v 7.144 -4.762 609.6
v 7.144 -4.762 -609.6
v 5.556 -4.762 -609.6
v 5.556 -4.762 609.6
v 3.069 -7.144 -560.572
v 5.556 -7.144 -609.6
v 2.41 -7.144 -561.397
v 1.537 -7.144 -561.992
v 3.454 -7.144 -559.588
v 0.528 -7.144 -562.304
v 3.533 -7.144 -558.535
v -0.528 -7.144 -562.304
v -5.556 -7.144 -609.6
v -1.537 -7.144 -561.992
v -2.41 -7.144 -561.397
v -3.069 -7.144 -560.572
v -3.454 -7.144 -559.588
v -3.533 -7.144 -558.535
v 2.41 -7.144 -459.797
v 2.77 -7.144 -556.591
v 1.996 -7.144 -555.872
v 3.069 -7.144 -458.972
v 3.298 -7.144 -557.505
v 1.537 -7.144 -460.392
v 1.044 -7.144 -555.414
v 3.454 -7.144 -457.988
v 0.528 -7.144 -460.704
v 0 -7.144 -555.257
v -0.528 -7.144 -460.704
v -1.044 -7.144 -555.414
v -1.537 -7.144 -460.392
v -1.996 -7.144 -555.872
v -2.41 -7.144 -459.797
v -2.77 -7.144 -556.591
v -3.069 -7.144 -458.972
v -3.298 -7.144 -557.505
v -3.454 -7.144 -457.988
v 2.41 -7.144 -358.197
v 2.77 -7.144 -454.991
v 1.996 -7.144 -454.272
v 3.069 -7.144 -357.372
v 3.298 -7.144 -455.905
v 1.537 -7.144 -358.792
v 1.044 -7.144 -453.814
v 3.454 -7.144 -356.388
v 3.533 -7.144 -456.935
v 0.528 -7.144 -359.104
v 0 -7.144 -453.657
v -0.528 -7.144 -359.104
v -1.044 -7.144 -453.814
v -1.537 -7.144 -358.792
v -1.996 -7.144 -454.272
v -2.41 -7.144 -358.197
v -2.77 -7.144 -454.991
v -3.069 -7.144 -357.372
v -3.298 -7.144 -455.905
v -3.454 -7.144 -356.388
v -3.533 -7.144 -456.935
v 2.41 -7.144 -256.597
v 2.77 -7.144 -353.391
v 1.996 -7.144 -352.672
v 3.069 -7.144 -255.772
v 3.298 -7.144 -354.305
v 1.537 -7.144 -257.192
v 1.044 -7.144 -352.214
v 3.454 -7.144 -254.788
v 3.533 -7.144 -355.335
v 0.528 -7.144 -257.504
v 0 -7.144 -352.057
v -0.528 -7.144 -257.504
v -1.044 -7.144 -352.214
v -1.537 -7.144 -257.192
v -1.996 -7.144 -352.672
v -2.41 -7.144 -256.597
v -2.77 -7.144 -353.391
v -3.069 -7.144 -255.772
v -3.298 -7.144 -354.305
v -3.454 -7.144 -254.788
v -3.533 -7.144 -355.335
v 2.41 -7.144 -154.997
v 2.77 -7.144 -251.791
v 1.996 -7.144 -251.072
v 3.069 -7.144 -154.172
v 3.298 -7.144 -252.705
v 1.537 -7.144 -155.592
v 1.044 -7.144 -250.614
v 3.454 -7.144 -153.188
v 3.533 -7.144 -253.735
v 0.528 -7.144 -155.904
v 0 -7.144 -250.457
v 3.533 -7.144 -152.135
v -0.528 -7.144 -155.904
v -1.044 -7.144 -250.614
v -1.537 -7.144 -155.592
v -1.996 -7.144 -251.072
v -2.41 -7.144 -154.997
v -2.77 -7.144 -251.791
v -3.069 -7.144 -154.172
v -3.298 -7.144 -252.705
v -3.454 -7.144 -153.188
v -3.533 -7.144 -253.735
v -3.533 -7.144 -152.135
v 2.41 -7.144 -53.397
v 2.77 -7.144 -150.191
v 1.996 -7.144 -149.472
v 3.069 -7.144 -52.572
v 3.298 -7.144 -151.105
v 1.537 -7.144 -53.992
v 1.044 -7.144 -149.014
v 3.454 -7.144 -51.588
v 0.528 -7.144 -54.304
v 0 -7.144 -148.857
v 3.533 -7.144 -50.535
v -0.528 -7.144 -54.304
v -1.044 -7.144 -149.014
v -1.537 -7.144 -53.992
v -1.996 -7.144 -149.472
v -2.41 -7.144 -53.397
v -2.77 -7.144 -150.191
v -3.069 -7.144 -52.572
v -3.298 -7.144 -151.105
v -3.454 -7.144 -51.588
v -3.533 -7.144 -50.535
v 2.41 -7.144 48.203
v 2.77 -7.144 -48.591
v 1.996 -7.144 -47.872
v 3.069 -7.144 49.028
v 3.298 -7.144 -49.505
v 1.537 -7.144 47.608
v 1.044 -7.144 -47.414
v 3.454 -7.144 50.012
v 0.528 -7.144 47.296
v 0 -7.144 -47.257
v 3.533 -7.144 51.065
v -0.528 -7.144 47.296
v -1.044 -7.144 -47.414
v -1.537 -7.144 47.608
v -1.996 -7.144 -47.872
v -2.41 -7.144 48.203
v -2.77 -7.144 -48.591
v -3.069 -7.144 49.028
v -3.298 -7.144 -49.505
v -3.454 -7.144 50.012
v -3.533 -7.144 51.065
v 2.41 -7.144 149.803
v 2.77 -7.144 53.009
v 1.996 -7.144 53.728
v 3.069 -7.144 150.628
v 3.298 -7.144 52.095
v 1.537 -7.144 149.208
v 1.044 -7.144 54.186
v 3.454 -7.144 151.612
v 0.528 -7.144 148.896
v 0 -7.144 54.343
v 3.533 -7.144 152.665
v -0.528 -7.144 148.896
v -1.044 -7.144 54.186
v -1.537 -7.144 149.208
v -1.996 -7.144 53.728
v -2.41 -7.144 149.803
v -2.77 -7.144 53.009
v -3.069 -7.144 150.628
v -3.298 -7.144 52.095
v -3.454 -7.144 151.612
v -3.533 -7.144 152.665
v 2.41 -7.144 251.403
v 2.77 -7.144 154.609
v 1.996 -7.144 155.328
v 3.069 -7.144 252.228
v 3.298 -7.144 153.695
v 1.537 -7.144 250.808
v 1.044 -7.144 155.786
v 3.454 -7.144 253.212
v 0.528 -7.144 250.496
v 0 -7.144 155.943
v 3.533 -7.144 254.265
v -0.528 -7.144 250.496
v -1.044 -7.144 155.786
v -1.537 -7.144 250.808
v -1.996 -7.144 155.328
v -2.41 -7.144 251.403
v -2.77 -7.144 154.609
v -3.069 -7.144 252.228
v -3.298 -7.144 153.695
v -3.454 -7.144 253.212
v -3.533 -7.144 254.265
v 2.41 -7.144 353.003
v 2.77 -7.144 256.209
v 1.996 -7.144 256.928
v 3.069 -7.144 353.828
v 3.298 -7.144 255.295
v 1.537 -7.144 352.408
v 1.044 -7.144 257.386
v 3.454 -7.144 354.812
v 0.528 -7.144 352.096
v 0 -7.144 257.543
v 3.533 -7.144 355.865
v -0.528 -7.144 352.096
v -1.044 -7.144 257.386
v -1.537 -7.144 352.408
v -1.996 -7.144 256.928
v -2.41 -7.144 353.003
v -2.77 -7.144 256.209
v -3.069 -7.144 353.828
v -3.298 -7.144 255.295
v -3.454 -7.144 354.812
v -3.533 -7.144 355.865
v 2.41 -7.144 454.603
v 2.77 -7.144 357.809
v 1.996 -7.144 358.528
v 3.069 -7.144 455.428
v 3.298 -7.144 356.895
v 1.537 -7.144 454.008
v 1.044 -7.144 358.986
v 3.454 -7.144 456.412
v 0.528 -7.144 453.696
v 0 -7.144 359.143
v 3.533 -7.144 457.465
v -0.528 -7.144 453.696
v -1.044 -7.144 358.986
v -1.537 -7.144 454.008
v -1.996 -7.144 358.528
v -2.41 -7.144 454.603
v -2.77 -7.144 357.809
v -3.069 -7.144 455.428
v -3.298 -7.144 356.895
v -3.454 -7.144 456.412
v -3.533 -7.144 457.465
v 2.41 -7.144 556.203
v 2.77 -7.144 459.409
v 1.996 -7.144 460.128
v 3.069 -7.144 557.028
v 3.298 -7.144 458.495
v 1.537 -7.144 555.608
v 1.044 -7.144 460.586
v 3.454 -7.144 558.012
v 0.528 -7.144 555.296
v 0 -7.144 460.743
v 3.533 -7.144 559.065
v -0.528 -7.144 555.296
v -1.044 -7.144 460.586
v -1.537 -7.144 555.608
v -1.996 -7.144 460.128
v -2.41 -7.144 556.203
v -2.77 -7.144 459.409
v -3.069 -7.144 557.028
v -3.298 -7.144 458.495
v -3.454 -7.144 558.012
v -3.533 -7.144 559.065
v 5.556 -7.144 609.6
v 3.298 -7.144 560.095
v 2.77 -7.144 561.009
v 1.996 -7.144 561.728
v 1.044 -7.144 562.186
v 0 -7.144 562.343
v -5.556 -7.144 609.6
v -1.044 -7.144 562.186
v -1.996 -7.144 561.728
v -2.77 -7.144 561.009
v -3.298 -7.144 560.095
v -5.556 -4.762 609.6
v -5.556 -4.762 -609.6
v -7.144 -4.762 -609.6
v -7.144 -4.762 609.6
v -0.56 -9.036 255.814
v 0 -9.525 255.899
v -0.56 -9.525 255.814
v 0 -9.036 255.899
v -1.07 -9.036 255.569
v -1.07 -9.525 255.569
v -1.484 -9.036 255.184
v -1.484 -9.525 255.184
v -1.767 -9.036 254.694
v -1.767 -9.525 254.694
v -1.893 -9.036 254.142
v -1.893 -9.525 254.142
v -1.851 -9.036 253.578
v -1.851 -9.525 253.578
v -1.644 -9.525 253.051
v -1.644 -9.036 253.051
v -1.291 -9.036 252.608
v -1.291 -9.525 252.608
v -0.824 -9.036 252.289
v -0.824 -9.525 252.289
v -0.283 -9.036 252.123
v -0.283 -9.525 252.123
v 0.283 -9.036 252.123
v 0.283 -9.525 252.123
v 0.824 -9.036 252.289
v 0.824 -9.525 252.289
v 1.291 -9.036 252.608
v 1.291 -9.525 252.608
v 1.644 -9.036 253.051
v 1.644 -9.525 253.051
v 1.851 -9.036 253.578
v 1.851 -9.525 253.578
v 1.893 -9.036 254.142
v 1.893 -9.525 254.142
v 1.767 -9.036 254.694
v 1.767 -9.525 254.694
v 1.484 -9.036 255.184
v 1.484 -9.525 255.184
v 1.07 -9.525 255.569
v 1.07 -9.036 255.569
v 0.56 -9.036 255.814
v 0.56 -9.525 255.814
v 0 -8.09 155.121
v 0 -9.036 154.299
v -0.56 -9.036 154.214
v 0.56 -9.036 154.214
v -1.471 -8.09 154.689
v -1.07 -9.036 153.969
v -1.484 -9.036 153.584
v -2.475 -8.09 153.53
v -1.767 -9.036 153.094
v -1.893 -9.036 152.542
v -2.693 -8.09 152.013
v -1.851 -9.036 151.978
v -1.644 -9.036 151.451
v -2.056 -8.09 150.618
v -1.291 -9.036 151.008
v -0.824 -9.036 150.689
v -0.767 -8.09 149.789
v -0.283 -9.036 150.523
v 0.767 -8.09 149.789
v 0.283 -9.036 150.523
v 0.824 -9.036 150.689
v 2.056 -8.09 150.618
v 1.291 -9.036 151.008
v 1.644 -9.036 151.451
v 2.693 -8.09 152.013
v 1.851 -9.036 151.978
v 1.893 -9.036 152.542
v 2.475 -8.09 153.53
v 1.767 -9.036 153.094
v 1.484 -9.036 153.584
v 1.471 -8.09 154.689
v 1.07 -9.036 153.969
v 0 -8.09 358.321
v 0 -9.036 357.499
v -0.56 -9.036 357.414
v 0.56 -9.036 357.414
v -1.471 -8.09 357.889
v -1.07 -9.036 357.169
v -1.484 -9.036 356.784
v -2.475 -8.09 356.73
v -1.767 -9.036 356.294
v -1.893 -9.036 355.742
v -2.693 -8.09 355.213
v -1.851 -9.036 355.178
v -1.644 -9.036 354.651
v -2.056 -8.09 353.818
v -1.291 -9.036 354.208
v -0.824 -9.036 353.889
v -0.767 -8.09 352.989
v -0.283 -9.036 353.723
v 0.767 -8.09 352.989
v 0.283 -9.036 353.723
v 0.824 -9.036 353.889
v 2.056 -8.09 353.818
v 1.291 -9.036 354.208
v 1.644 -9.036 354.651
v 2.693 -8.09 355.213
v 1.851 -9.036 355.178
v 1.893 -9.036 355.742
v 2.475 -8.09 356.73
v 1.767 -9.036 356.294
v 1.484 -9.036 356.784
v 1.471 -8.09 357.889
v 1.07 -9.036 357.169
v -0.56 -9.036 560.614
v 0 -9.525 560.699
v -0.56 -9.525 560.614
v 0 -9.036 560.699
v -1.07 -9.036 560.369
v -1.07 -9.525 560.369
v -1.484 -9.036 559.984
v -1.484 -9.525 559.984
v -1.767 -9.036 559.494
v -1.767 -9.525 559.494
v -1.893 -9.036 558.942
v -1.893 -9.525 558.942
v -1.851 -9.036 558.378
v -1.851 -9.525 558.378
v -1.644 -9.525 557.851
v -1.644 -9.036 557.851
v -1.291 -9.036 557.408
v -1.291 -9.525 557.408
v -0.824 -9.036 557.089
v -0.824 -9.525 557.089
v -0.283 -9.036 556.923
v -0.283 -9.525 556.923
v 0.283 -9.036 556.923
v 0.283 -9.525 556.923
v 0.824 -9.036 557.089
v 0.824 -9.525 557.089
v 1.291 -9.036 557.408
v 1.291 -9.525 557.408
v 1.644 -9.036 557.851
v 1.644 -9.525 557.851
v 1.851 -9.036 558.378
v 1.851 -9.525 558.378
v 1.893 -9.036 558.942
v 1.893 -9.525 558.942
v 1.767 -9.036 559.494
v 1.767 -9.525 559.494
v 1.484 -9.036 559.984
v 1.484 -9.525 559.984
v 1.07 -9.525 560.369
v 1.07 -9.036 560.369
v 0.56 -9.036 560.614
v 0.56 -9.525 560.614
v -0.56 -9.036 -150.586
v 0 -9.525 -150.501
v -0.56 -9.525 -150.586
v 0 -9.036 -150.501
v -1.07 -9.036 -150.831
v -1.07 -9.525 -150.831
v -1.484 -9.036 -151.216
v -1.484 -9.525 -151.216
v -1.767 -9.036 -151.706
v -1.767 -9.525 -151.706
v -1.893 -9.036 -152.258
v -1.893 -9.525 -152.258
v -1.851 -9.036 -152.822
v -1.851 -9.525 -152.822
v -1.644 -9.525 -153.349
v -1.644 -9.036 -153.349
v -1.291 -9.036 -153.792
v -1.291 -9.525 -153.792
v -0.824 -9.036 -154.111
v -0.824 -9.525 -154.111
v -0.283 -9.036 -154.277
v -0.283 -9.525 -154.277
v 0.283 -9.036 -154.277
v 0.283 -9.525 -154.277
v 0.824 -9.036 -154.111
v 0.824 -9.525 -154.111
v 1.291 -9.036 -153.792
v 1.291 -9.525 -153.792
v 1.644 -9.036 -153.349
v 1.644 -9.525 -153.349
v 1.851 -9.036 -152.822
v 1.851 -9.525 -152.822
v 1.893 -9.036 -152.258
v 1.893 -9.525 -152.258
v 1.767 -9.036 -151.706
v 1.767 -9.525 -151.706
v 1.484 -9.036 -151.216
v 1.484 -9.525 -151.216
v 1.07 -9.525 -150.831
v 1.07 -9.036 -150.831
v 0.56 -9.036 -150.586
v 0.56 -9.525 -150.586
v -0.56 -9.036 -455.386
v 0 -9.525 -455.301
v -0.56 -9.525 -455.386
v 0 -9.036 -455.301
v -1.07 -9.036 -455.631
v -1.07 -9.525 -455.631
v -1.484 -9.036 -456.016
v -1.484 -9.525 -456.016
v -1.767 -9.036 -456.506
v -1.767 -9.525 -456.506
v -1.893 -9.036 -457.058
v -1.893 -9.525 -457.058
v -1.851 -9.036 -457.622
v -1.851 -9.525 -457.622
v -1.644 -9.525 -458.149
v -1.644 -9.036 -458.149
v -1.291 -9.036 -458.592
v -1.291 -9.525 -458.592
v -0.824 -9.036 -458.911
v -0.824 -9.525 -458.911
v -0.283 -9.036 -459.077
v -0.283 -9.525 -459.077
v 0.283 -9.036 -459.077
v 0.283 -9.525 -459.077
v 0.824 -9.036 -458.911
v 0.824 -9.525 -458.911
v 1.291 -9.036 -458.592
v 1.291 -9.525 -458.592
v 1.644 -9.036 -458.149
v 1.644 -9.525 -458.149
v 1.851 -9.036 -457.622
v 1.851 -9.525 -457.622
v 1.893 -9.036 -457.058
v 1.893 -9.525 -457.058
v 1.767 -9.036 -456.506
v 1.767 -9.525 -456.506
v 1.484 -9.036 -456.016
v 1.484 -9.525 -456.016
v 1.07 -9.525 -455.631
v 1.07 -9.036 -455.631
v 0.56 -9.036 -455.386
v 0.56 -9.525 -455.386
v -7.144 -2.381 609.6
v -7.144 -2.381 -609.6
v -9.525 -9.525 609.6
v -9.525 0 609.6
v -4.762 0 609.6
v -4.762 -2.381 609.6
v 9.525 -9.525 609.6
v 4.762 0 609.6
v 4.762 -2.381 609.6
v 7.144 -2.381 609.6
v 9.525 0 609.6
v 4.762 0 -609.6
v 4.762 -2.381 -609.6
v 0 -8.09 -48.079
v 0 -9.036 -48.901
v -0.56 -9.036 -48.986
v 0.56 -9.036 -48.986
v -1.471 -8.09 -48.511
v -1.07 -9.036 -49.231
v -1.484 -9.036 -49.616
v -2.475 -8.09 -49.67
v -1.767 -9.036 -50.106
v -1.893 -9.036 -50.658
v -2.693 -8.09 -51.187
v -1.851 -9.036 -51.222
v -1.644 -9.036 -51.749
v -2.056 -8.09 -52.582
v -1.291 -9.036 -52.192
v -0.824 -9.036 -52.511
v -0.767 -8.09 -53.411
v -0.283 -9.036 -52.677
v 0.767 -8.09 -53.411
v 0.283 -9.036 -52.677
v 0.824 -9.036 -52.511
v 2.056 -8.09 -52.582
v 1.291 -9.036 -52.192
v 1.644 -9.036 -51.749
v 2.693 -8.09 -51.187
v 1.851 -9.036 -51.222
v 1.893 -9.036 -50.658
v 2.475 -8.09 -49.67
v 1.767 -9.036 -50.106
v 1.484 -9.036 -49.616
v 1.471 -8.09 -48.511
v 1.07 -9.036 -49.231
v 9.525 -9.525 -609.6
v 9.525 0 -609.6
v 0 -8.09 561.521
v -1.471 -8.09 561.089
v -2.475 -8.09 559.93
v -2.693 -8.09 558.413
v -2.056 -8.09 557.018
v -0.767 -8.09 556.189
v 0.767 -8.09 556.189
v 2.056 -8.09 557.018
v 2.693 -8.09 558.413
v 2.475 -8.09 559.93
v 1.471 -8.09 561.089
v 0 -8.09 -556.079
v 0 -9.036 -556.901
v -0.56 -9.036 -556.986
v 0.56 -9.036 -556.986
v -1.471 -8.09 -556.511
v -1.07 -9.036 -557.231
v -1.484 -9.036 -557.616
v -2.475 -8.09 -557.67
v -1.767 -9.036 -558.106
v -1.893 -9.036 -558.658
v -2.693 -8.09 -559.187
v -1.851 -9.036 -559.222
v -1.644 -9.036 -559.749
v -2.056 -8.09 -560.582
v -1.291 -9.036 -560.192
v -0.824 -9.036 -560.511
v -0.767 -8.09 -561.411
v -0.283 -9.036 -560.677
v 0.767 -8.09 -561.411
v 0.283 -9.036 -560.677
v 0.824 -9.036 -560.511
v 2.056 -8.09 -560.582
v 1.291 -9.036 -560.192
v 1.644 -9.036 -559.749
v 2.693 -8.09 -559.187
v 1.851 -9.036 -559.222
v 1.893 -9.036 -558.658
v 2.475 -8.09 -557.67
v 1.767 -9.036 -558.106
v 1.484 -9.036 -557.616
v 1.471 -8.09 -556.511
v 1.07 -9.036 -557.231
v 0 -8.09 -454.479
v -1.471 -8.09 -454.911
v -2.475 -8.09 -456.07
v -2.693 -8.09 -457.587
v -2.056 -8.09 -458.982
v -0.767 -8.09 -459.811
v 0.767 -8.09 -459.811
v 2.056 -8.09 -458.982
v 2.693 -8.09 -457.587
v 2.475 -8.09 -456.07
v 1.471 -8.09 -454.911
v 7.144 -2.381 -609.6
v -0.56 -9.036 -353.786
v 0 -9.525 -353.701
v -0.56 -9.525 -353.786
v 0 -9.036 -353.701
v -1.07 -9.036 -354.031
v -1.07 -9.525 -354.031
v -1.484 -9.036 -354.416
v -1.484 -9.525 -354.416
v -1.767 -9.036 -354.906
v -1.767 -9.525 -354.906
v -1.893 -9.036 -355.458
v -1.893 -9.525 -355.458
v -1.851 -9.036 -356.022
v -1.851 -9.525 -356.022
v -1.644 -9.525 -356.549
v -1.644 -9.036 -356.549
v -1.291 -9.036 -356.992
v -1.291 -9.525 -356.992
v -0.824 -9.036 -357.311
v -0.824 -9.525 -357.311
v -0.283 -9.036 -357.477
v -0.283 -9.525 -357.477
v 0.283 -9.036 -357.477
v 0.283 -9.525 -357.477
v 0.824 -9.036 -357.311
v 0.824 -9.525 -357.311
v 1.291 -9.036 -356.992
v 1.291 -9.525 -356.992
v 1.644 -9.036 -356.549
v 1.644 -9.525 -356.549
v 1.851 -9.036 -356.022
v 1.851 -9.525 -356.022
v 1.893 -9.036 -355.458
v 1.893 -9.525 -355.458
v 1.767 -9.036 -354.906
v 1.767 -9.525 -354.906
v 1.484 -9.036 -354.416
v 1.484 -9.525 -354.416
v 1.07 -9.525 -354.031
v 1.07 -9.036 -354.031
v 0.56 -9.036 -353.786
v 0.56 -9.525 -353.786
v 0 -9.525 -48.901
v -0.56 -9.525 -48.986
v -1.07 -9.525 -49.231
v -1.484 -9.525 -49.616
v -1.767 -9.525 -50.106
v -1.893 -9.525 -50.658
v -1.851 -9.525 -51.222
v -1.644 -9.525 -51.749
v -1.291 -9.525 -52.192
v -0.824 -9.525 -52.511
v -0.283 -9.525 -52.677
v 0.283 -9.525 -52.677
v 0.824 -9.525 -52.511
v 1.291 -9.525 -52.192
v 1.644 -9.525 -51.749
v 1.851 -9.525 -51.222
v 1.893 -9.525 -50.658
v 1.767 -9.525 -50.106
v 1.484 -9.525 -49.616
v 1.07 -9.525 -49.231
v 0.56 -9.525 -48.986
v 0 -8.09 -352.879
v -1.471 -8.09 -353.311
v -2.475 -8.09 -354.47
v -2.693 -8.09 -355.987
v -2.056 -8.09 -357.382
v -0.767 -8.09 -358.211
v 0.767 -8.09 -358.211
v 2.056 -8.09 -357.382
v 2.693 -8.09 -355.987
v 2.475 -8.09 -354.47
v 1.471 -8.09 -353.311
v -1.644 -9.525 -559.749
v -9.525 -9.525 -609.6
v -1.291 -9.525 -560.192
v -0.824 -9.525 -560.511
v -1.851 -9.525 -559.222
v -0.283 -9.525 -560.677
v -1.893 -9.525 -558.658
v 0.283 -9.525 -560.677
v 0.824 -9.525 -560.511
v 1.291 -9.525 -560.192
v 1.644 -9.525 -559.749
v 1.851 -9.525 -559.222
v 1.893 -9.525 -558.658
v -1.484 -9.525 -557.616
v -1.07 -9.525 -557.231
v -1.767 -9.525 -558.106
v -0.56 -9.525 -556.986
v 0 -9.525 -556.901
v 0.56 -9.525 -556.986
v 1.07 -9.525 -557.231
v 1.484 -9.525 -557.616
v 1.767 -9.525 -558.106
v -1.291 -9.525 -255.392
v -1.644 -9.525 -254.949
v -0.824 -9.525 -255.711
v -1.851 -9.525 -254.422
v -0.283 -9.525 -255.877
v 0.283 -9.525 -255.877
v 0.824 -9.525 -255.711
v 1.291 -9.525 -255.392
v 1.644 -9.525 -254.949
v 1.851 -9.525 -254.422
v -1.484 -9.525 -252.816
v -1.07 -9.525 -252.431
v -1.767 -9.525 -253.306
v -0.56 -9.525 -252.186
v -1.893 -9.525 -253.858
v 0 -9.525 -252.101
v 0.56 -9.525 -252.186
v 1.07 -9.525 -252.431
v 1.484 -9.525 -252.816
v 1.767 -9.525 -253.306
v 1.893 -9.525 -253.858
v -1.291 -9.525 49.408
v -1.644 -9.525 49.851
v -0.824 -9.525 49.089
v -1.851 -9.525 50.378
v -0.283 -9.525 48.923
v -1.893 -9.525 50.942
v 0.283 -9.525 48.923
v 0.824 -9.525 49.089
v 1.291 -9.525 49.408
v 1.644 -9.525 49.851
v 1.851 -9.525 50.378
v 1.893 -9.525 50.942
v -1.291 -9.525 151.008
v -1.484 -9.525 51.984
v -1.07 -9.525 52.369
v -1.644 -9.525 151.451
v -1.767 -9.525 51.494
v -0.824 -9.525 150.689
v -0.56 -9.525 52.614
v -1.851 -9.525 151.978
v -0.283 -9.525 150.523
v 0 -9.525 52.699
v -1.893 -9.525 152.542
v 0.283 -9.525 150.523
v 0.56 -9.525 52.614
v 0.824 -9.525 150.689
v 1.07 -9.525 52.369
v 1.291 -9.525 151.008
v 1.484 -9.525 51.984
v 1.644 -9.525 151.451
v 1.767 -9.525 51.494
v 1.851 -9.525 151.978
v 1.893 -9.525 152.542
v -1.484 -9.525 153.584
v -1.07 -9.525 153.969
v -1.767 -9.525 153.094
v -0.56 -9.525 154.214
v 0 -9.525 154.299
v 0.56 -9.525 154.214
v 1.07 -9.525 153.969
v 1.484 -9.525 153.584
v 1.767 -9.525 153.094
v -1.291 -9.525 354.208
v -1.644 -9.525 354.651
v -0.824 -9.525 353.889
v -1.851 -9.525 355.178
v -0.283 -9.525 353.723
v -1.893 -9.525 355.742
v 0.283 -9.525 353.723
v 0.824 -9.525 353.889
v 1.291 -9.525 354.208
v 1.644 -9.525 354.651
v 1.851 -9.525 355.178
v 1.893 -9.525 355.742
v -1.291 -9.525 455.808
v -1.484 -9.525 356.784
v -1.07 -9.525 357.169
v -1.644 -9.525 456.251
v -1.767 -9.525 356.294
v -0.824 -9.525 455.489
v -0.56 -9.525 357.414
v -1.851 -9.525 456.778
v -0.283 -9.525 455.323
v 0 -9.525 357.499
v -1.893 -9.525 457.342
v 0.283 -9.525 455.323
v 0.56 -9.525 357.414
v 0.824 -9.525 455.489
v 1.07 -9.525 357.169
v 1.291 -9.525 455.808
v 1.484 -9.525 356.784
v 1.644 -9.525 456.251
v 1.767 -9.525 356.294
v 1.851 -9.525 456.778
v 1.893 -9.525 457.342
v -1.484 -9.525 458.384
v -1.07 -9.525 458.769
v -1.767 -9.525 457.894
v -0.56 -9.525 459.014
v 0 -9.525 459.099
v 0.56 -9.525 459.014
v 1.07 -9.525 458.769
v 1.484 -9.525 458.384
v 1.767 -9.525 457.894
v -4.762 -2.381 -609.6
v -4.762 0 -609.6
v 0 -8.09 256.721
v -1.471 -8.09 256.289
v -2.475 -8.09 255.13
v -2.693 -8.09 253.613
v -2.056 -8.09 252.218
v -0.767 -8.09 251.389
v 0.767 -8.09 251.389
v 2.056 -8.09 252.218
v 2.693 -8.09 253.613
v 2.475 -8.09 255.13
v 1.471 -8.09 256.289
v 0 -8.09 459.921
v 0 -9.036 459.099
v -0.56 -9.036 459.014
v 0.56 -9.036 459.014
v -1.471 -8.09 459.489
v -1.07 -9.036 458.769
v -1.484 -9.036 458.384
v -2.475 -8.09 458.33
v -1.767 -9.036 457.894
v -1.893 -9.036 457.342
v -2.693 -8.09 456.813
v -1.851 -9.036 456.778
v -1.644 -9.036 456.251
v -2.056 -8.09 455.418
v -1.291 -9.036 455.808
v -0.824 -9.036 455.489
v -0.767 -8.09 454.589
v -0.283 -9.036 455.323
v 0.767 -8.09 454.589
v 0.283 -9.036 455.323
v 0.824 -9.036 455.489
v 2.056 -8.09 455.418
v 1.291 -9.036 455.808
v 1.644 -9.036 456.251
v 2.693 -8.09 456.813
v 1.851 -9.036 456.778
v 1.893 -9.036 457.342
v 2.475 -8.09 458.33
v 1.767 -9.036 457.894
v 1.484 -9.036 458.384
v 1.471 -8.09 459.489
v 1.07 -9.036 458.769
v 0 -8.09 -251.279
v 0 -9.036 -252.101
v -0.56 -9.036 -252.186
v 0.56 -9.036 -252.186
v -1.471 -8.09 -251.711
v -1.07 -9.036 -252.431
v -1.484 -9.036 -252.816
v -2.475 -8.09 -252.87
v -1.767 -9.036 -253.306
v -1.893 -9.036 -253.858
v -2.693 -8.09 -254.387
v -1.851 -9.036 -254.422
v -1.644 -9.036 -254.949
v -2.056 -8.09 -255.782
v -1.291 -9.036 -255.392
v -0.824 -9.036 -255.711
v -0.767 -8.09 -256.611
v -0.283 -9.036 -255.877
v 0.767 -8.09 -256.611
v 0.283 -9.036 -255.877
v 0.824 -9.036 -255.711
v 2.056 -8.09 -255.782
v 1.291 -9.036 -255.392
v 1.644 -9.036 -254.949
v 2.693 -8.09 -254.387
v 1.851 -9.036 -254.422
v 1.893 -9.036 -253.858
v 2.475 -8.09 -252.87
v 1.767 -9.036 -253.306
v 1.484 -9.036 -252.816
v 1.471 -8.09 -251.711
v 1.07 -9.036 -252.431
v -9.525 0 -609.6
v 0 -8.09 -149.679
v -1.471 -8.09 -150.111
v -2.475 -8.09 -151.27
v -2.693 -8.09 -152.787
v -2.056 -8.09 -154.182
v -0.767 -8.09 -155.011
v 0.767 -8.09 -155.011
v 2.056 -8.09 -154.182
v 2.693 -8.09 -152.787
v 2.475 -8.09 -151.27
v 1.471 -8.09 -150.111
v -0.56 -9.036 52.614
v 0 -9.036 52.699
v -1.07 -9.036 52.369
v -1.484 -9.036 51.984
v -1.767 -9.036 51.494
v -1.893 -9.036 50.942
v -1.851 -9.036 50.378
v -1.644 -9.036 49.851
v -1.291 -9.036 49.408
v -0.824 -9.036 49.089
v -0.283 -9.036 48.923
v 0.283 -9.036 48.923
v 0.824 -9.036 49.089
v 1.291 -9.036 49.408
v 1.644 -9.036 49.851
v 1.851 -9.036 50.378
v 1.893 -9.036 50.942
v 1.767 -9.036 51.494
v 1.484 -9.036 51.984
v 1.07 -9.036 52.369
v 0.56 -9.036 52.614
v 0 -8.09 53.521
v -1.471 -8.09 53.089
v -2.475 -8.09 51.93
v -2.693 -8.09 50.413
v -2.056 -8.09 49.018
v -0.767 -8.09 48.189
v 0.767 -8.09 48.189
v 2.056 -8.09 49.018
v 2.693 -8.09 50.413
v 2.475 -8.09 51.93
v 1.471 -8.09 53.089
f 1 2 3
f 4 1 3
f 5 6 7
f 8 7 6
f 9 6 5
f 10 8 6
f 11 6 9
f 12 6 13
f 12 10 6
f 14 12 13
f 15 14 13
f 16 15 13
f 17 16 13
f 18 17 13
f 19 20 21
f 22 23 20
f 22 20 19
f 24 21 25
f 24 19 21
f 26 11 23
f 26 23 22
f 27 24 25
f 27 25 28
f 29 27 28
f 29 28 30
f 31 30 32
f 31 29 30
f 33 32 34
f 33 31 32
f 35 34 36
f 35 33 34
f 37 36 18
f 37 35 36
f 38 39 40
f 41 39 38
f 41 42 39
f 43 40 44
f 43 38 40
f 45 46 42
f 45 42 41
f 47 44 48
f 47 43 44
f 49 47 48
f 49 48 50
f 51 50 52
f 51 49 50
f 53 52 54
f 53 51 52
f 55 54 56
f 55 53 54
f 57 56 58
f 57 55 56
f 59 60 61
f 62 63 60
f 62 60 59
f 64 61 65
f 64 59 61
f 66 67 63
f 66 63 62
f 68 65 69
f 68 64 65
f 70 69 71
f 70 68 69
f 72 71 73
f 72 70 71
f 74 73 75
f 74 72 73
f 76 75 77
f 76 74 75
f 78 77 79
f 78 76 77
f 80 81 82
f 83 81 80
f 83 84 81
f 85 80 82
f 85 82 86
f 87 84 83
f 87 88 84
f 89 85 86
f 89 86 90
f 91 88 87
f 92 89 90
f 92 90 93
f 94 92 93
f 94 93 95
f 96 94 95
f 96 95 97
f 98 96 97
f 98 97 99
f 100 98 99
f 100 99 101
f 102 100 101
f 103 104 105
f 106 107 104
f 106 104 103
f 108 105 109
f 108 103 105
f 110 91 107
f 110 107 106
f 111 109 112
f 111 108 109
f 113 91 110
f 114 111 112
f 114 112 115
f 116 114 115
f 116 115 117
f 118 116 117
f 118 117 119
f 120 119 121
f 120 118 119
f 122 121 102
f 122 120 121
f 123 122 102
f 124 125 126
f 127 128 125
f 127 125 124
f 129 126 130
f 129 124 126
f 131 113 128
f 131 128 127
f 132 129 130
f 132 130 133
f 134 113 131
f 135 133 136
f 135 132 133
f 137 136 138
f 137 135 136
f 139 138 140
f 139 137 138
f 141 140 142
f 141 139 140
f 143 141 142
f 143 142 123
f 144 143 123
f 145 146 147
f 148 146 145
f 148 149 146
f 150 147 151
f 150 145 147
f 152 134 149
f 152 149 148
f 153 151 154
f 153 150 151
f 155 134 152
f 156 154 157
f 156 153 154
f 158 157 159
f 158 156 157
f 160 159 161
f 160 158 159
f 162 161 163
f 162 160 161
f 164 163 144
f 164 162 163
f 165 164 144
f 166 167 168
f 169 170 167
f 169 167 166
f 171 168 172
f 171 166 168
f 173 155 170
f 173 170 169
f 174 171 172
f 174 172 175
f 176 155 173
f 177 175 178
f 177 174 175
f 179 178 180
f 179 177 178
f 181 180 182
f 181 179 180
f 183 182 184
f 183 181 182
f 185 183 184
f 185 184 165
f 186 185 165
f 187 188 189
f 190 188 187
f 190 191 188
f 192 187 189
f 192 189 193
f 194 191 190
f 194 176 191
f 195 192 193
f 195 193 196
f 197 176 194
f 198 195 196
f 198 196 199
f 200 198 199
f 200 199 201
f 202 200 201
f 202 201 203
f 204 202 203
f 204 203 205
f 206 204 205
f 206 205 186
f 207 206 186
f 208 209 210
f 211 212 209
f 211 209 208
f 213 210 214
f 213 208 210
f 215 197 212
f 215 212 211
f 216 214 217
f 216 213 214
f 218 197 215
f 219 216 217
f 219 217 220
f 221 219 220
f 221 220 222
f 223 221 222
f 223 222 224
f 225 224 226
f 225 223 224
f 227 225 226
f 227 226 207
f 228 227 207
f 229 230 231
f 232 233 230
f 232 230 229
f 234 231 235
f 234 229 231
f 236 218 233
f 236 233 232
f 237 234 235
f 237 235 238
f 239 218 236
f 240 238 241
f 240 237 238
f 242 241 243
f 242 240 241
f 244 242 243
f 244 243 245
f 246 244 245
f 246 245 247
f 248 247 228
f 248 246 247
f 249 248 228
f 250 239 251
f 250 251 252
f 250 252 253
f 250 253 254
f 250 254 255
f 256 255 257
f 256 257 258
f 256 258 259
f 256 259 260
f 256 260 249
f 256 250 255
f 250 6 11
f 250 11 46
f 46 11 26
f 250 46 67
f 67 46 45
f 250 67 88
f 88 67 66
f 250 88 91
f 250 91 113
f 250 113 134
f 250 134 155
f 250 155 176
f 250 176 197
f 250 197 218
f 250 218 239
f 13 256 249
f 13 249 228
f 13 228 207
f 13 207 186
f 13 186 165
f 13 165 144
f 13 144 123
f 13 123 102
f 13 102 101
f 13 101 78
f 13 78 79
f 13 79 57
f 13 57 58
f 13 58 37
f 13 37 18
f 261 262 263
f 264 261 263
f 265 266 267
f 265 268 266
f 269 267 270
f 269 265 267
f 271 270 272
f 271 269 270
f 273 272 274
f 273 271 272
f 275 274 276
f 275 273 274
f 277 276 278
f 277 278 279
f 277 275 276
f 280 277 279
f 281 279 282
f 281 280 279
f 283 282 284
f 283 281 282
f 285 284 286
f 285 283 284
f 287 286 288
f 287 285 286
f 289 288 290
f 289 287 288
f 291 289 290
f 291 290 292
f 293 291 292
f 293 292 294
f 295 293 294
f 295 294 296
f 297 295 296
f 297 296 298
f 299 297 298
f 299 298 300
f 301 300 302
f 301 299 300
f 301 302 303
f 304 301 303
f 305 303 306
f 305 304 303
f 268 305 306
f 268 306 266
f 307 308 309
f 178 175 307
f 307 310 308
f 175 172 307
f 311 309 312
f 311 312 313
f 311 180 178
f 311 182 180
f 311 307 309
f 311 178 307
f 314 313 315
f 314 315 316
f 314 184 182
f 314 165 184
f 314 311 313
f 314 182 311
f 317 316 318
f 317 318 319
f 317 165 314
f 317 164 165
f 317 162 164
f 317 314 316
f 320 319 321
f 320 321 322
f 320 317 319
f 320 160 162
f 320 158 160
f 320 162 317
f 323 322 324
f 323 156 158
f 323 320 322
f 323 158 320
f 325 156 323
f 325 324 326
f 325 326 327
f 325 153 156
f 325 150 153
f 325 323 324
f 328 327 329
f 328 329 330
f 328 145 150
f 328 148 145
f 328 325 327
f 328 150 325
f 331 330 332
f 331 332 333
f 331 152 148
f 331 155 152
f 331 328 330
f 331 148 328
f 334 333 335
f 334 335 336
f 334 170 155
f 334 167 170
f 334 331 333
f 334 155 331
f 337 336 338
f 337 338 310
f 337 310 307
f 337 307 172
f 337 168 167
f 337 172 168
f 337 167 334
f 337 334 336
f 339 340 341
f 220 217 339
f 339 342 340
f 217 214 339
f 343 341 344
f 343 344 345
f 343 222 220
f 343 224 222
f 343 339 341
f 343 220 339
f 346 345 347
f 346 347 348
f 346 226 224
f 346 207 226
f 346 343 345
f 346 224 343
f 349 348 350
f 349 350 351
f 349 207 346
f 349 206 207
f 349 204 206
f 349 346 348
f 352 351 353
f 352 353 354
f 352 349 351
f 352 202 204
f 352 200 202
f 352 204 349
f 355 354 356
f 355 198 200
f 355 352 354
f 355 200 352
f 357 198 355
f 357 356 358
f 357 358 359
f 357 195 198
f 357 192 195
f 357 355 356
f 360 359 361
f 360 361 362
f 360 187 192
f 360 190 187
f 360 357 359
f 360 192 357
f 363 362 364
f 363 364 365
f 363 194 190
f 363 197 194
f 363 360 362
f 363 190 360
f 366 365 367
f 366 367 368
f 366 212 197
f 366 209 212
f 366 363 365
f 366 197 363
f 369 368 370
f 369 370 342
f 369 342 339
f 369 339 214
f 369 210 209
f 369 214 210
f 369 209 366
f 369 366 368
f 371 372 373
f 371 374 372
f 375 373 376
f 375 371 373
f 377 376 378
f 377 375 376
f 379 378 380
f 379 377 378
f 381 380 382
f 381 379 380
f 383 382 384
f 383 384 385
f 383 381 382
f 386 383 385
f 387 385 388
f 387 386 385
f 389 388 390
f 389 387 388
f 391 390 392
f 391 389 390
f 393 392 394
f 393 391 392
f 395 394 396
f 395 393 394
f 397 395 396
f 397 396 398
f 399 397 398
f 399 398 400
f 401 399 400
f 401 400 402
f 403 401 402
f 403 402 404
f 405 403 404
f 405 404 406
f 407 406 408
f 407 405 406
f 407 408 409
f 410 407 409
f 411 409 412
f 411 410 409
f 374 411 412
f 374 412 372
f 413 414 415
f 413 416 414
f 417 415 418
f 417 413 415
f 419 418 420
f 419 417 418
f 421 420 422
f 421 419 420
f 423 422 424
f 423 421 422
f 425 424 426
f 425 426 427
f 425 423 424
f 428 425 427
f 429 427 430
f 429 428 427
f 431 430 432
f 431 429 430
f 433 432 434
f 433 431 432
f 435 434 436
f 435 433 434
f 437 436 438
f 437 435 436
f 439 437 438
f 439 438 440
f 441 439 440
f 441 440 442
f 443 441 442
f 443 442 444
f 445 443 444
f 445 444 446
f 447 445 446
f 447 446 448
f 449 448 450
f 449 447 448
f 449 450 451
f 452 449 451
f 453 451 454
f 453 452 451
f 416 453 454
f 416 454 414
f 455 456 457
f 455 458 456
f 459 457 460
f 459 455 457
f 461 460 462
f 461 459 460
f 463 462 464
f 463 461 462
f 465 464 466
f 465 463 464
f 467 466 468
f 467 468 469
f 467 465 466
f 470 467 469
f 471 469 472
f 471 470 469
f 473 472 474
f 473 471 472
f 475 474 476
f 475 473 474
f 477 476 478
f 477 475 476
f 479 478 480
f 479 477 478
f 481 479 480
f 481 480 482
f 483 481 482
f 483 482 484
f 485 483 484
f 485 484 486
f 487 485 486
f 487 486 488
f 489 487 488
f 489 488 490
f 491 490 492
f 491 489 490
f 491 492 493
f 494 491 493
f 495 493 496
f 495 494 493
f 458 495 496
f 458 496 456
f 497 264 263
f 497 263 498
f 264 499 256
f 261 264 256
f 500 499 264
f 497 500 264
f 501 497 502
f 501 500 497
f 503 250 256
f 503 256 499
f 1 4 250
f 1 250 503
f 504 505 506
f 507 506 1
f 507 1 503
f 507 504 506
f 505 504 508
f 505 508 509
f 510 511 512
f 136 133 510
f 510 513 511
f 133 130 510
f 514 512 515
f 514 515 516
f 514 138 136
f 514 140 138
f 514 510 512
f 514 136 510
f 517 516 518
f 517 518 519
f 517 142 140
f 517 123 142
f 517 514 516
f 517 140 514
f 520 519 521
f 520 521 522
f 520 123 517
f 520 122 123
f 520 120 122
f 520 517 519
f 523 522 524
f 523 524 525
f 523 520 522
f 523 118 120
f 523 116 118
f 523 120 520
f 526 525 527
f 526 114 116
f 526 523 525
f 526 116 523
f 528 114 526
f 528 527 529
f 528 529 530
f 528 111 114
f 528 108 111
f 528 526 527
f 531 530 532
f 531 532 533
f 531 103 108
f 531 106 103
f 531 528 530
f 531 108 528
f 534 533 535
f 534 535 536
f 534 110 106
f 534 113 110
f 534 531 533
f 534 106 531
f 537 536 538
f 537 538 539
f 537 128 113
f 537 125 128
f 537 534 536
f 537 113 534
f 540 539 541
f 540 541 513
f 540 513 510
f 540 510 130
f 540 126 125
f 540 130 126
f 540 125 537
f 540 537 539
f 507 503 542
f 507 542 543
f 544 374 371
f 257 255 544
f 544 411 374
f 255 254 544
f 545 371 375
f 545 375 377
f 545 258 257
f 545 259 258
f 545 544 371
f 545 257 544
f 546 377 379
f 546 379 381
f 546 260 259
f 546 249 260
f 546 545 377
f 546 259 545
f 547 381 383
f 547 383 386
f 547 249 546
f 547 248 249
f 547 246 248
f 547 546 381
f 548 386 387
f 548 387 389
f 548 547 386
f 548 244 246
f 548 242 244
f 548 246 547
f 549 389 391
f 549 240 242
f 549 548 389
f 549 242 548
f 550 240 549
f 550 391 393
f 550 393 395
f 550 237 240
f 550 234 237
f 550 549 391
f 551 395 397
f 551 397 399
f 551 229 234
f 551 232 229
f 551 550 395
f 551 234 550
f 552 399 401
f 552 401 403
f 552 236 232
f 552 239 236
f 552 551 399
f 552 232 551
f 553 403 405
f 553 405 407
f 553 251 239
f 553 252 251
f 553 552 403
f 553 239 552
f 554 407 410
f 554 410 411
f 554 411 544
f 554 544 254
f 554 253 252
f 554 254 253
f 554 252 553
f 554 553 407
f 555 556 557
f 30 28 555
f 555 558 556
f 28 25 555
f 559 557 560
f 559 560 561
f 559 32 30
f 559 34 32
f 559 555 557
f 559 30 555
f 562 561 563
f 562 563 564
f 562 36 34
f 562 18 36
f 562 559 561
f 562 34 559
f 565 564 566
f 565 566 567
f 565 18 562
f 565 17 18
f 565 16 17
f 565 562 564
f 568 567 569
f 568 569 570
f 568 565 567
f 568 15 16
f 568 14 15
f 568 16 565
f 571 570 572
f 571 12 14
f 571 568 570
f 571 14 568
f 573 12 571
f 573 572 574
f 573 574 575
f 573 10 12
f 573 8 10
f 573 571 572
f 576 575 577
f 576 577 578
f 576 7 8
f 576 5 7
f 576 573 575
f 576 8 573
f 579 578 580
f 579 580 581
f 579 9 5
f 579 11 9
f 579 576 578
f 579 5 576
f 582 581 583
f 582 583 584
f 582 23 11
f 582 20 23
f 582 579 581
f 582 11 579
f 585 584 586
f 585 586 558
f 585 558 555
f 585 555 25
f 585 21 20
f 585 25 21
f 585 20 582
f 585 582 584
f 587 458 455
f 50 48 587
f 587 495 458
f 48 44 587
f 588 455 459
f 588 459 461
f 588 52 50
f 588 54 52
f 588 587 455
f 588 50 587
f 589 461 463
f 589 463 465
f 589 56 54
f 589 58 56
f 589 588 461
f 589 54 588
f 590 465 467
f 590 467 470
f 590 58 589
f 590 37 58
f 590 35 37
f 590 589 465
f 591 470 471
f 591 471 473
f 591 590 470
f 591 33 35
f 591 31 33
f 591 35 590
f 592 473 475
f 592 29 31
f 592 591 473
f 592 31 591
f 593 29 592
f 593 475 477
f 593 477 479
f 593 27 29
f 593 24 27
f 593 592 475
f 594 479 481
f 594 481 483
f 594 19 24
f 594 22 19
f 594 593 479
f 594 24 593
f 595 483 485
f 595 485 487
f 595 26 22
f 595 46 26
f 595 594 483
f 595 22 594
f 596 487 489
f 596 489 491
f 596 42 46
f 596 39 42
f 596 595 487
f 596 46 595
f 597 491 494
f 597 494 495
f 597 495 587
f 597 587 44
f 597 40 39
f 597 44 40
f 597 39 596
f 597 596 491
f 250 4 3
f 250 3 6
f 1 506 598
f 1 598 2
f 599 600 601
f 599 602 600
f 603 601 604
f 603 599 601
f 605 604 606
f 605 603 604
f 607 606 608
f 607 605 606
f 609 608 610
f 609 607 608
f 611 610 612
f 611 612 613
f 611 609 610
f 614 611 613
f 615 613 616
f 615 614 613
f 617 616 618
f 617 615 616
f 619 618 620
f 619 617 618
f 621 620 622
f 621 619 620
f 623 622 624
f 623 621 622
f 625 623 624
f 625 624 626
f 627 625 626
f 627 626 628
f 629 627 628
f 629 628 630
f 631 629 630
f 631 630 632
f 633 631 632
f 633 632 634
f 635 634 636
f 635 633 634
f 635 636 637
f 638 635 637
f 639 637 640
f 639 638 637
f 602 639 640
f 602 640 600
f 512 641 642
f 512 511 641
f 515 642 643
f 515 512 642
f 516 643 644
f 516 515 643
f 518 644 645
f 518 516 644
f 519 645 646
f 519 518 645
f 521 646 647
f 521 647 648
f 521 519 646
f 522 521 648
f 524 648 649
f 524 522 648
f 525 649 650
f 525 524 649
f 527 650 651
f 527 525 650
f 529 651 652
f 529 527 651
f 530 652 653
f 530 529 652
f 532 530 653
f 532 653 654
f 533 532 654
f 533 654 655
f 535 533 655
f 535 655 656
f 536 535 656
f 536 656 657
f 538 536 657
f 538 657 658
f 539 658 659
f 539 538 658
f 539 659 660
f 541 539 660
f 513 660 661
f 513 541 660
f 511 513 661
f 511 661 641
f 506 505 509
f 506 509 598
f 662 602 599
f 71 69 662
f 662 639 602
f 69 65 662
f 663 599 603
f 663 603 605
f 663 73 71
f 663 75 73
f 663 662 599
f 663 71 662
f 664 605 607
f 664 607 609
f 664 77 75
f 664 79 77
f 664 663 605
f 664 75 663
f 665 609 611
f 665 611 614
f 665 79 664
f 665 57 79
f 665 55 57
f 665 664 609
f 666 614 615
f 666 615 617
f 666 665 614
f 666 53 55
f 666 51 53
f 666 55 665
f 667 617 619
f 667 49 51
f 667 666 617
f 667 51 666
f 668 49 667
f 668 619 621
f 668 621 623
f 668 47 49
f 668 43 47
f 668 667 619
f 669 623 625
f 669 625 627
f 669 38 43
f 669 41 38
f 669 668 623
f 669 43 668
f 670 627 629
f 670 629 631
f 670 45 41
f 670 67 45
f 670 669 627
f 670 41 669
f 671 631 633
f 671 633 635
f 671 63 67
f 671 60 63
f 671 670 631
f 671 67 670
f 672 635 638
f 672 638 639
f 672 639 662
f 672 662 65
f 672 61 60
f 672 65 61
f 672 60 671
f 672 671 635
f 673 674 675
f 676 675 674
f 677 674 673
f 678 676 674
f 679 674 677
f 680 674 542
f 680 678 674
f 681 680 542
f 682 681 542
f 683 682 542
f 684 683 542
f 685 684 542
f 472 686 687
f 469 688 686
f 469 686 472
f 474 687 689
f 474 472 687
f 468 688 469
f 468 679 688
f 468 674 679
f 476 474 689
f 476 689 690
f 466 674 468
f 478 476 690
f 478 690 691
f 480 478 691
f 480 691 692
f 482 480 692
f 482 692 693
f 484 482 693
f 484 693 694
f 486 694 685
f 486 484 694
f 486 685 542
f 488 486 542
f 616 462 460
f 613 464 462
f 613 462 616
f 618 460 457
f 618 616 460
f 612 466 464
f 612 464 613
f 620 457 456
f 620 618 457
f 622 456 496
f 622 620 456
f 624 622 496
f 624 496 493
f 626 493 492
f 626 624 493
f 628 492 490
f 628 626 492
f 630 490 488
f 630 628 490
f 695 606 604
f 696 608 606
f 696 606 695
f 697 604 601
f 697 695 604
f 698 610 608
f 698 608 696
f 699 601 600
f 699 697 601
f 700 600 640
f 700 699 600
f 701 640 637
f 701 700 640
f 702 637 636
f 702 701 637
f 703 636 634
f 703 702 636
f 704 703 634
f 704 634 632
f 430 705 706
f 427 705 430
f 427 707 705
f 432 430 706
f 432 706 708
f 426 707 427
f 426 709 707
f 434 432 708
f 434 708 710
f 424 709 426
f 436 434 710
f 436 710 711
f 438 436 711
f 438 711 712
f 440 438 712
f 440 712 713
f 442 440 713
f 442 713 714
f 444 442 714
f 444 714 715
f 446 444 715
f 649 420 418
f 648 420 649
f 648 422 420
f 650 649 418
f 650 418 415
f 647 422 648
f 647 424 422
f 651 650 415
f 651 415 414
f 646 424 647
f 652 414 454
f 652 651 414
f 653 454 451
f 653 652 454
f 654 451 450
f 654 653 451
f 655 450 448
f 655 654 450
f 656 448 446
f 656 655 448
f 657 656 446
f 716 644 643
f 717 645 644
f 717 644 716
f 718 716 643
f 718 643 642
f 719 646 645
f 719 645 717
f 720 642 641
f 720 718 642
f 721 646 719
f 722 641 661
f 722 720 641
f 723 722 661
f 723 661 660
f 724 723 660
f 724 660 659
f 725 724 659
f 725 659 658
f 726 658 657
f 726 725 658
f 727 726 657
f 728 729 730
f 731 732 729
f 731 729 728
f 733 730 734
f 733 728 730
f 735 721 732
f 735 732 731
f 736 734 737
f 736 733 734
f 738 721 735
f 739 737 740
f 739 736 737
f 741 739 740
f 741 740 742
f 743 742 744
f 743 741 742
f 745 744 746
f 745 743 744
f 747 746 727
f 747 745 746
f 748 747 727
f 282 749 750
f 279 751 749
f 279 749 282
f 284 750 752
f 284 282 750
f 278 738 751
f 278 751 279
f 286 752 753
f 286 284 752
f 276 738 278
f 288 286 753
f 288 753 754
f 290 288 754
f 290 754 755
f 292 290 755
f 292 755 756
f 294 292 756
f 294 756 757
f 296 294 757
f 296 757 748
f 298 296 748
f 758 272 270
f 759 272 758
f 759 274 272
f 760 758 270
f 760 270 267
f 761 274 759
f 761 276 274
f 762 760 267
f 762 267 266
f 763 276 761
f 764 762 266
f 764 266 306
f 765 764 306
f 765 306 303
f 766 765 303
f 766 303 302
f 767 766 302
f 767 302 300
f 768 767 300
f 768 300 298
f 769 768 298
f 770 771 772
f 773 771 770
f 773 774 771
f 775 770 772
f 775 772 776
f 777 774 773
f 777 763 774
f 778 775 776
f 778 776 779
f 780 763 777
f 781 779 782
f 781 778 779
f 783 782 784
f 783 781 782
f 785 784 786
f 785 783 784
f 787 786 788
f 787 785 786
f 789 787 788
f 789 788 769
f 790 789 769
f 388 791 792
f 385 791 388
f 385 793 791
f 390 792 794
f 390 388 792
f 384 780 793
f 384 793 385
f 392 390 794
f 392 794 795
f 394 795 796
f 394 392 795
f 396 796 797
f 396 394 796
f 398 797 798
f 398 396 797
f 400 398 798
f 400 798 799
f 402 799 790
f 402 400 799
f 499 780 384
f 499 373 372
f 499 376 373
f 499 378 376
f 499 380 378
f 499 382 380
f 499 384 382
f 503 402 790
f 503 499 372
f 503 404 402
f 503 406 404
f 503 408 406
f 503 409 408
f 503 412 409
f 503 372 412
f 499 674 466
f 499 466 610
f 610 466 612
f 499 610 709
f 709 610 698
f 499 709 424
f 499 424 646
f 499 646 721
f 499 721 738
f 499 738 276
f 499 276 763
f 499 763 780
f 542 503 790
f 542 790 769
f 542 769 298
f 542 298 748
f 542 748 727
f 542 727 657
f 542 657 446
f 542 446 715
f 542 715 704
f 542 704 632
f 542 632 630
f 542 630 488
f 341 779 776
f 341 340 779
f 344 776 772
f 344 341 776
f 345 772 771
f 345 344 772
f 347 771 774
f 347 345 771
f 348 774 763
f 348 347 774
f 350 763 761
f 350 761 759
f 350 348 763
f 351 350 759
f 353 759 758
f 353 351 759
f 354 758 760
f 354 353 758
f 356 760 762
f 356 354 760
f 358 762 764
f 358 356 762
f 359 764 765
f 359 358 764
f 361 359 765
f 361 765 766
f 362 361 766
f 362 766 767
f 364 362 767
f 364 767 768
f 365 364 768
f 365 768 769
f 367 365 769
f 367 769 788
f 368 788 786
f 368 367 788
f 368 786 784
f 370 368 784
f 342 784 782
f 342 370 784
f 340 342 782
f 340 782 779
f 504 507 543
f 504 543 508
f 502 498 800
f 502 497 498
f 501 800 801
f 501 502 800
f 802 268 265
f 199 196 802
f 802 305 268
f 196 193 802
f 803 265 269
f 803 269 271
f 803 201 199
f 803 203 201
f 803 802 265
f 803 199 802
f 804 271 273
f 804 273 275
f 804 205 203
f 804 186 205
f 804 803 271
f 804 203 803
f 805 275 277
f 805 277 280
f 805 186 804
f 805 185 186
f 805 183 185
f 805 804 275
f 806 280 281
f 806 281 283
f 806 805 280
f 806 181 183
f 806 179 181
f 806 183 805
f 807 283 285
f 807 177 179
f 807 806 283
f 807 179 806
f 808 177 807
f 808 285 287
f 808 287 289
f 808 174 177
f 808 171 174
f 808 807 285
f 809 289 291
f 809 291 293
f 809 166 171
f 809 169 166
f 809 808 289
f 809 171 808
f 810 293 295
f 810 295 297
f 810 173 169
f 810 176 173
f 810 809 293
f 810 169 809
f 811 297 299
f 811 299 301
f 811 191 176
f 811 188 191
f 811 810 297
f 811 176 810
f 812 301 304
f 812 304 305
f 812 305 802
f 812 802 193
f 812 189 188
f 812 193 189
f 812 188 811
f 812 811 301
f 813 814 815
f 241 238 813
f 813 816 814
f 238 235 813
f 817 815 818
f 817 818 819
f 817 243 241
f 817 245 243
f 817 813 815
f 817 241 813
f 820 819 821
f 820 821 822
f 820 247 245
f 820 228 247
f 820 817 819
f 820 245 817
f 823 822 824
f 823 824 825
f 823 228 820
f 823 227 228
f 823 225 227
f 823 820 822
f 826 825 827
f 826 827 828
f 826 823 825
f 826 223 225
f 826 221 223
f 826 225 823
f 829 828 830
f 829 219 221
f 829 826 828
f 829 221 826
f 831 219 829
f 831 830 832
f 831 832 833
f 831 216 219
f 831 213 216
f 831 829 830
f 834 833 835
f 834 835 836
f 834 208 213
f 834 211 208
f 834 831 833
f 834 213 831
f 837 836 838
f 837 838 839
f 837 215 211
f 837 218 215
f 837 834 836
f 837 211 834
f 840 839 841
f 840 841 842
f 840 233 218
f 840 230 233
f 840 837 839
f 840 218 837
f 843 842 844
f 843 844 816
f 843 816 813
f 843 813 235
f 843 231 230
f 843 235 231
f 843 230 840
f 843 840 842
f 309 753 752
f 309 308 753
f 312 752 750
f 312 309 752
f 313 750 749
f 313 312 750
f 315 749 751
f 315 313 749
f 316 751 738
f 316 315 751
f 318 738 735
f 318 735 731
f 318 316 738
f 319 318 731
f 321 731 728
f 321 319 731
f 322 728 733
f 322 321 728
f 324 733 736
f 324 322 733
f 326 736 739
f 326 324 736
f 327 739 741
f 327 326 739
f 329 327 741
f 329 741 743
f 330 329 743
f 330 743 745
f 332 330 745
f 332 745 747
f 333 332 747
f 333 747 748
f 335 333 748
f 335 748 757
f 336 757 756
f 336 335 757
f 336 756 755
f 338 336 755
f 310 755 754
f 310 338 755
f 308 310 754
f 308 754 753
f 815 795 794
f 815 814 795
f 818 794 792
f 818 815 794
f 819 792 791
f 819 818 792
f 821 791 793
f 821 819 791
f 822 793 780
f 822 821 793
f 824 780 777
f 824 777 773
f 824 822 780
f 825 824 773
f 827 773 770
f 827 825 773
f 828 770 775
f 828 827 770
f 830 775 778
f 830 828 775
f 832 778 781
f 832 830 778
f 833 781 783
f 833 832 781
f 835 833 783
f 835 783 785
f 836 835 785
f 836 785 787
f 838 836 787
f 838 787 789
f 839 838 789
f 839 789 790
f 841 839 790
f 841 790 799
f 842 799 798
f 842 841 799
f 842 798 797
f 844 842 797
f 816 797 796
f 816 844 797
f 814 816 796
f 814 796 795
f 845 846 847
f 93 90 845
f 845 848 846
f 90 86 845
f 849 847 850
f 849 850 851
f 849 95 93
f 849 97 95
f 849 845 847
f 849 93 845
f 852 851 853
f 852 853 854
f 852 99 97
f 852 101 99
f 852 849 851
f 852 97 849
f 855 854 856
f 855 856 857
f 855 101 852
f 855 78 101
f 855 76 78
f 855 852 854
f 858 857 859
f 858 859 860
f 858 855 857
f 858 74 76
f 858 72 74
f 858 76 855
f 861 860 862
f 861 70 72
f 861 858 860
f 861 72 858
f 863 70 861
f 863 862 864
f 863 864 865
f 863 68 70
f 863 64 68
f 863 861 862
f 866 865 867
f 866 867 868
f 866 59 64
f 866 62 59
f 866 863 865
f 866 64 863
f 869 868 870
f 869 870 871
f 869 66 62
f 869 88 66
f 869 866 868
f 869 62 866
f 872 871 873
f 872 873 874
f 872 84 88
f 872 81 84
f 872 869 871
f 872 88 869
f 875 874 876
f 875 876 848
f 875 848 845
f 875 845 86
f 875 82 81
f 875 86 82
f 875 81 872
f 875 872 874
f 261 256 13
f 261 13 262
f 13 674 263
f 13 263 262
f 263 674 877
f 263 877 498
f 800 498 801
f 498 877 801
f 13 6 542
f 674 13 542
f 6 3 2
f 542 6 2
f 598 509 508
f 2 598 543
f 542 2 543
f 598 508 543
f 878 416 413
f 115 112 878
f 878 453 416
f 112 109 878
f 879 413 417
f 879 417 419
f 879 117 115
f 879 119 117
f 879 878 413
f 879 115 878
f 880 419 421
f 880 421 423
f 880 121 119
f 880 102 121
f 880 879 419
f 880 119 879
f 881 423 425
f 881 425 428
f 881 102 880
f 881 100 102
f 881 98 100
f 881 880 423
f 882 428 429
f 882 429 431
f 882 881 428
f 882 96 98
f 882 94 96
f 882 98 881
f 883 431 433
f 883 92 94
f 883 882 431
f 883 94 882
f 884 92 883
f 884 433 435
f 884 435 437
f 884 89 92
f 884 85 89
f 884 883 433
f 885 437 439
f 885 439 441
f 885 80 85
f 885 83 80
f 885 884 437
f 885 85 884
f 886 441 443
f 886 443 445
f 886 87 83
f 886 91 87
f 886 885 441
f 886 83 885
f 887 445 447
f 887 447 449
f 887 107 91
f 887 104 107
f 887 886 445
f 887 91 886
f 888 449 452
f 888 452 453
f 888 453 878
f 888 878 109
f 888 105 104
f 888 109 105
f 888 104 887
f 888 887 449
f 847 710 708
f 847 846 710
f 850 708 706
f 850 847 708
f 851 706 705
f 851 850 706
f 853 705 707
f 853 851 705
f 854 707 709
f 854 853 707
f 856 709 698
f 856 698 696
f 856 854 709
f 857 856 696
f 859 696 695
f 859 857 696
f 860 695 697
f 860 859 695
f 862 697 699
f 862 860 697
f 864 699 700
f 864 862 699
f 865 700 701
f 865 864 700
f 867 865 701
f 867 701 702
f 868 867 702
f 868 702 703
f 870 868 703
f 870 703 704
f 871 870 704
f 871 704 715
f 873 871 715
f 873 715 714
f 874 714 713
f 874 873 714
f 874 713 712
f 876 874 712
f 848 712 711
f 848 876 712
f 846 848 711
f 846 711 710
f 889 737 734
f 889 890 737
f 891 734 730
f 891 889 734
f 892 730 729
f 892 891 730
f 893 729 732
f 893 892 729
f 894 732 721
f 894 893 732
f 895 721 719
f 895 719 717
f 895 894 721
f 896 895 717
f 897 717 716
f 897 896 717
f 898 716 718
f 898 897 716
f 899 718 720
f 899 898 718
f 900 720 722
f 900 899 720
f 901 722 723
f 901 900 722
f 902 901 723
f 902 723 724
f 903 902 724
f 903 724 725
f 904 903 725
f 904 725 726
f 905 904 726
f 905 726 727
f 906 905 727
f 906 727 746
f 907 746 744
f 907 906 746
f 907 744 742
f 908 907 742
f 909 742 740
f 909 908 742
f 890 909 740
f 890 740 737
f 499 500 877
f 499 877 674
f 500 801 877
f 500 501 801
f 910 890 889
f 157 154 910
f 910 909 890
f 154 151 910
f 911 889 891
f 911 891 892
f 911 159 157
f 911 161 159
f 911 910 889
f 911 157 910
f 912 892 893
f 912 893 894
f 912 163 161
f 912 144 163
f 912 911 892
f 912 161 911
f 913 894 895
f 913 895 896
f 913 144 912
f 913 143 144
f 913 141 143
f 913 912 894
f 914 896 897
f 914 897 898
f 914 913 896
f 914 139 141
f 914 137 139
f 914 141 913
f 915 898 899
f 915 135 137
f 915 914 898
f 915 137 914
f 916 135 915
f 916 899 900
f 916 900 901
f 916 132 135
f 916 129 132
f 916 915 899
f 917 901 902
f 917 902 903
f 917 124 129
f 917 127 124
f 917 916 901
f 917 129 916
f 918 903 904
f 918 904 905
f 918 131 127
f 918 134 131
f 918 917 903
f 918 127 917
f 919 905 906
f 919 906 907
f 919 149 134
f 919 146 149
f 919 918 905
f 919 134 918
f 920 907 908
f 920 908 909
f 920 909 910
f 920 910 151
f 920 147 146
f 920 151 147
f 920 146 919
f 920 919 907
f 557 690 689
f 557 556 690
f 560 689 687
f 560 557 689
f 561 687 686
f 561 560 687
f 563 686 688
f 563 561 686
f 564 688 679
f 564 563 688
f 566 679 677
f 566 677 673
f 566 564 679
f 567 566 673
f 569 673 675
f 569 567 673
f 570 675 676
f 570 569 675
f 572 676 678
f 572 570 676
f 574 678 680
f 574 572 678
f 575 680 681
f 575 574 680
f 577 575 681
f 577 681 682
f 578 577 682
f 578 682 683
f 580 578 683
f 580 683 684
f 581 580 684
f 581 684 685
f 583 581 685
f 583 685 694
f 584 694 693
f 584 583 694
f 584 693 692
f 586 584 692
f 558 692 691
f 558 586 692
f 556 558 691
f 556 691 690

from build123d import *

# Parameters (mm, degrees)
BOSS_EXTRUDE1_DEPTH = 609.6
LPATTERN1_COUNT     = 12
LPATTERN1_PITCH     = 101.6


with BuildPart() as part:
    # Sketch1 → Boss-Extrude1 (new, symmetric)
    with BuildSketch(Plane.XY):
        Polygon((-4.7625, 0), (-9.525, 0), (-9.525, -9.525), (9.525, -9.525), (9.525, 0), (4.7625, 0), (4.7625, -2.38125), (7.14375, -2.38125), (7.14375, -4.7625), (5.55625, -4.7625), (5.55625, -7.14375), (-5.55625, -7.14375), (-5.55625, -4.7625), (-7.14375, -4.7625), (-7.14375, -2.38125), (-4.7625, -2.38125), align=None)
    extrude(amount=BOSS_EXTRUDE1_DEPTH, both=True)

    # Sketch7 → CSK for #6 Flat Head Machine Screw2 (revolve, cut)
    with BuildSketch(Plane(origin=(0, -7.14375, -558.8), x_dir=(0, 0, 1), z_dir=(1, 0, 0))):
        Polygon((0, 0), (0, 2.38125), (1.89865, 2.38125), (1.89865, 1.891953401), (3.5433, 0), align=None)
    csk_for_6_flat_head_machine_screw2 = revolve(axis=Axis((0, -0.79375, -558.8), (0, -1, 0)), mode=Mode.SUBTRACT)

    # LPattern1: CSK for #6 Flat Head Machine Screw2 ×12
    with Locations(*[(0, 0, i * LPATTERN1_PITCH) for i in range(1, LPATTERN1_COUNT)]):
        add(csk_for_6_flat_head_machine_screw2, mode=Mode.SUBTRACT)


solid = part.part
